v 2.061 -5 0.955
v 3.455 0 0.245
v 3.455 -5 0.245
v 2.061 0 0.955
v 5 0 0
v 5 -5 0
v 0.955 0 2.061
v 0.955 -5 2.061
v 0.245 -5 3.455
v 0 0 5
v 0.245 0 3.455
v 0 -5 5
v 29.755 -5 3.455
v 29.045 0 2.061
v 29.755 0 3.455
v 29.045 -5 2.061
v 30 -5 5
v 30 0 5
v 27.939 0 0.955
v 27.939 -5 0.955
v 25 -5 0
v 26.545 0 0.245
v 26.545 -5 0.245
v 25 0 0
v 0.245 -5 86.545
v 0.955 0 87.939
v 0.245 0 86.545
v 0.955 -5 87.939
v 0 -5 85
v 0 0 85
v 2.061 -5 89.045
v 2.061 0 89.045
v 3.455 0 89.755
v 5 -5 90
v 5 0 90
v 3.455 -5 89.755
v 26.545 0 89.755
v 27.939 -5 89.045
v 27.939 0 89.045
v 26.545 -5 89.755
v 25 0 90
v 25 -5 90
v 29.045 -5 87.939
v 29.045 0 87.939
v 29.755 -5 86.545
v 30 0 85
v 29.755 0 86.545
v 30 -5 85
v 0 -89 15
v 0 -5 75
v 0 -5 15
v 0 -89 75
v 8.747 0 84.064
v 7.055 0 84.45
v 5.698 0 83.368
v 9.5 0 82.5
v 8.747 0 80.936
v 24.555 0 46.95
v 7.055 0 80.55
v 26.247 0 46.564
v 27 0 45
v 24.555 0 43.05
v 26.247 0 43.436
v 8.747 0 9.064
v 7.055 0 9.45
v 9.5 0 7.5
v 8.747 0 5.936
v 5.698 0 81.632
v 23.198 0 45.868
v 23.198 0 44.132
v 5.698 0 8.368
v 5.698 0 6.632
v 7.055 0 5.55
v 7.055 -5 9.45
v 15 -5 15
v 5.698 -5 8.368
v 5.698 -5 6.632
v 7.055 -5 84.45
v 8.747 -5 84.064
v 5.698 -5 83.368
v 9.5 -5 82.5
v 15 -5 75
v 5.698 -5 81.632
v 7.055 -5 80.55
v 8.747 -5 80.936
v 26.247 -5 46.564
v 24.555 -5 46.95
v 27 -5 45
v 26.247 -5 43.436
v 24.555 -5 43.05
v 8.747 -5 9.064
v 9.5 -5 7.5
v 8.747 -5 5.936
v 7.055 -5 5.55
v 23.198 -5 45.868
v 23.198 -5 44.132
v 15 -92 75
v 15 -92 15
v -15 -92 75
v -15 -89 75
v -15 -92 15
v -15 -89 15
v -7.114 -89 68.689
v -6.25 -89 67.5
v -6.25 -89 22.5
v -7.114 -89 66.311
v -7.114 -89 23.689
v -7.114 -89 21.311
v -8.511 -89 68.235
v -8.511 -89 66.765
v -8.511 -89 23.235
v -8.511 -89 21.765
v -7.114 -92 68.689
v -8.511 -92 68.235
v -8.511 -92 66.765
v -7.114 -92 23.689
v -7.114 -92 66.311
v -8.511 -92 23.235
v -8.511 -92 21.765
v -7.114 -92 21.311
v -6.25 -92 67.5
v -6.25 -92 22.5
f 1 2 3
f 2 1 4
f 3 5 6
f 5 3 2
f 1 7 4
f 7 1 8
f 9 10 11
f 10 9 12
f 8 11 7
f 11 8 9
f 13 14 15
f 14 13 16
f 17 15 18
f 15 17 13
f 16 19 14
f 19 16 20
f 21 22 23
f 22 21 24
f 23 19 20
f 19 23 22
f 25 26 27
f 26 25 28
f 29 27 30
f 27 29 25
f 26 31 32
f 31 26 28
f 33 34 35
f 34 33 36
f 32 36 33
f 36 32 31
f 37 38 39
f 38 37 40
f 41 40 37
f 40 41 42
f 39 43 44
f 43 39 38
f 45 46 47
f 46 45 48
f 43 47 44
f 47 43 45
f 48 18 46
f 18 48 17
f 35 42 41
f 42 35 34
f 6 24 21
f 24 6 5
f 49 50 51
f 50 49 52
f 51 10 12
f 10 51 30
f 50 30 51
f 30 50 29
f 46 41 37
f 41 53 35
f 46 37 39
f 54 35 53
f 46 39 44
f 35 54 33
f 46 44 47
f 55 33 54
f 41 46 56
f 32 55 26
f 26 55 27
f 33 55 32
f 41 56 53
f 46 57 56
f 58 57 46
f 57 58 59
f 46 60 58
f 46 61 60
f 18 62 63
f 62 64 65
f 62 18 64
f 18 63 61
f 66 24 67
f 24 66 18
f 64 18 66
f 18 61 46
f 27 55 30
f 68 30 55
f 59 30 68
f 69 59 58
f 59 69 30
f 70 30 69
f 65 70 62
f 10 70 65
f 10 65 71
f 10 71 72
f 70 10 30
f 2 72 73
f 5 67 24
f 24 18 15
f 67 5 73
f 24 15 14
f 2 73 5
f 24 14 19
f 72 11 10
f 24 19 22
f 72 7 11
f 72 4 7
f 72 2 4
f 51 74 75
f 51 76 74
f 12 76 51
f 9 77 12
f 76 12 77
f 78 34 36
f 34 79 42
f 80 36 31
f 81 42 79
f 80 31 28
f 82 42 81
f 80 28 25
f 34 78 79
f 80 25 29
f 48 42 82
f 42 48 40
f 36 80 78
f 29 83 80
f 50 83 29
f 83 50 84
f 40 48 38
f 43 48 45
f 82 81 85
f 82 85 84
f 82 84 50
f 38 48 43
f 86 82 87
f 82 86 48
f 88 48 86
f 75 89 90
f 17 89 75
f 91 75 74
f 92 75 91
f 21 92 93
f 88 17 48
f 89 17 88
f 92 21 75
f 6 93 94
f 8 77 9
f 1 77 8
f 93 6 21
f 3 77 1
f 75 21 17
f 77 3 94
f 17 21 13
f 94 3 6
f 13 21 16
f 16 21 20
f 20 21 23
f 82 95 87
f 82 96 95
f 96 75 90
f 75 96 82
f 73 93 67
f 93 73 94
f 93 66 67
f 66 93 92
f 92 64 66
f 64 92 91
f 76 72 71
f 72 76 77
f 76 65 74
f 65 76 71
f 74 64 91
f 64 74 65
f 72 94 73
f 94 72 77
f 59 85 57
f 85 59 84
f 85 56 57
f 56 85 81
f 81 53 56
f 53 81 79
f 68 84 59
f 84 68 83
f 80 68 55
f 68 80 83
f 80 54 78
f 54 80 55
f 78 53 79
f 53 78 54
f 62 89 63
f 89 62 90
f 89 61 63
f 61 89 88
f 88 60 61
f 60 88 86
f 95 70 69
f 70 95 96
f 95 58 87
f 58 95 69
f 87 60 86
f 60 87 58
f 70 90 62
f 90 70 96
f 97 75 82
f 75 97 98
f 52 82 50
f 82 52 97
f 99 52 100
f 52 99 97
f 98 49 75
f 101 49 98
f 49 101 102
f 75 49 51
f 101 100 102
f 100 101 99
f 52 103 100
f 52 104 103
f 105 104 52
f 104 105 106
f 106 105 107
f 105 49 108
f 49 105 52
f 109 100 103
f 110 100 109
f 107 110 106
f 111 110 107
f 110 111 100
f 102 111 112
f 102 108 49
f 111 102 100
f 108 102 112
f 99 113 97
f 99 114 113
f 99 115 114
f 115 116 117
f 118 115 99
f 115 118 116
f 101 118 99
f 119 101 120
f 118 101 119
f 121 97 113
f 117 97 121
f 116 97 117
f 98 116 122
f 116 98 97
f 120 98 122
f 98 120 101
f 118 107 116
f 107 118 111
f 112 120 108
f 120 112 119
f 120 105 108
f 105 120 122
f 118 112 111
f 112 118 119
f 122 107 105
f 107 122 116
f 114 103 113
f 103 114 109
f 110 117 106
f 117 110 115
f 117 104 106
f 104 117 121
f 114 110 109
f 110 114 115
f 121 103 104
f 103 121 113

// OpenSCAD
// front to back 52
// width 23

baseWidth = 30;
baseHeight = 90;
baseThick = 5;
baseCorner = 5;
baseScrew = 4;      //#8 = 4mm
blockWidth = 15;
blockHeight = 60;
blockDepth = 89;
mountWidth = 30;
mountHeight = 5;
mountThick = 3;
mountScrewDiamater = 2.5;
mountScrewHeight = 12;
mountScrewSpace = 45;

translate([0,-baseThick,0]){
    difference(){
			//create the base plate
			cube([baseWidth,baseThick,baseHeight]);
			//round bottom left
			translate([0,0,0]) rotate([-90,270,0]) fillet(baseCorner,baseThick,$fn=20);
			//round bottom right
			translate([30,0,0]) rotate([-90,180,0]) fillet(baseCorner,baseThick,$fn=20);
			//round top left
			translate([0,0,90]) rotate([-90,0,0]) fillet(baseCorner,baseThick,$fn=20);
			//round top right
			translate([30,0,90]) rotate([-90,90,0]) fillet(baseCorner,baseThick,$fn=20);
			//top screw
			translate([blockWidth/2,-1,(baseHeight-blockHeight)/4]) 
					rotate([-90,0,0]) cylinder(d=baseScrew, h = baseThick+2);
			//bottom screw
			translate([blockWidth/2,-1,baseHeight-(baseHeight-blockHeight)/4]) 
					rotate([-90,0,0]) cylinder(d=baseScrew, h = baseThick+2);
			//side screw
			translate([baseWidth-baseScrew-1,-1,baseHeight/2]) 
					rotate([-90,0,0]) cylinder(d=baseScrew, h = baseThick+2);

    }
}

translate([0,-blockDepth,(baseHeight-blockHeight)/2])
	cube([blockWidth,blockDepth,blockHeight]);


translate([-blockWidth,-blockDepth-mountThick,(baseHeight-blockHeight)/2]){
    difference(){
        cube([mountWidth,mountThick,blockHeight]);
        translate([mountWidth/4,-1,blockHeight/2-mountScrewSpace/2]) rotate([270,0,0])
            #cylinder(d=mountScrewDiamater, h=mountScrewHeight+1);
        translate([mountWidth/4,-1,blockHeight	/2+mountScrewSpace/2]) rotate([270,0,0])
            #cylinder(d=mountScrewDiamater, h=mountScrewHeight);
    }
}



module fillet(radius = 1, height = 1){
    translate([radius, radius, -1]) rotate([0,0,180])
        difference(){
            cube([radius + 1, radius + 1, height + 2]);
            #cylinder(r = radius, h = height + 2);
        }
}
